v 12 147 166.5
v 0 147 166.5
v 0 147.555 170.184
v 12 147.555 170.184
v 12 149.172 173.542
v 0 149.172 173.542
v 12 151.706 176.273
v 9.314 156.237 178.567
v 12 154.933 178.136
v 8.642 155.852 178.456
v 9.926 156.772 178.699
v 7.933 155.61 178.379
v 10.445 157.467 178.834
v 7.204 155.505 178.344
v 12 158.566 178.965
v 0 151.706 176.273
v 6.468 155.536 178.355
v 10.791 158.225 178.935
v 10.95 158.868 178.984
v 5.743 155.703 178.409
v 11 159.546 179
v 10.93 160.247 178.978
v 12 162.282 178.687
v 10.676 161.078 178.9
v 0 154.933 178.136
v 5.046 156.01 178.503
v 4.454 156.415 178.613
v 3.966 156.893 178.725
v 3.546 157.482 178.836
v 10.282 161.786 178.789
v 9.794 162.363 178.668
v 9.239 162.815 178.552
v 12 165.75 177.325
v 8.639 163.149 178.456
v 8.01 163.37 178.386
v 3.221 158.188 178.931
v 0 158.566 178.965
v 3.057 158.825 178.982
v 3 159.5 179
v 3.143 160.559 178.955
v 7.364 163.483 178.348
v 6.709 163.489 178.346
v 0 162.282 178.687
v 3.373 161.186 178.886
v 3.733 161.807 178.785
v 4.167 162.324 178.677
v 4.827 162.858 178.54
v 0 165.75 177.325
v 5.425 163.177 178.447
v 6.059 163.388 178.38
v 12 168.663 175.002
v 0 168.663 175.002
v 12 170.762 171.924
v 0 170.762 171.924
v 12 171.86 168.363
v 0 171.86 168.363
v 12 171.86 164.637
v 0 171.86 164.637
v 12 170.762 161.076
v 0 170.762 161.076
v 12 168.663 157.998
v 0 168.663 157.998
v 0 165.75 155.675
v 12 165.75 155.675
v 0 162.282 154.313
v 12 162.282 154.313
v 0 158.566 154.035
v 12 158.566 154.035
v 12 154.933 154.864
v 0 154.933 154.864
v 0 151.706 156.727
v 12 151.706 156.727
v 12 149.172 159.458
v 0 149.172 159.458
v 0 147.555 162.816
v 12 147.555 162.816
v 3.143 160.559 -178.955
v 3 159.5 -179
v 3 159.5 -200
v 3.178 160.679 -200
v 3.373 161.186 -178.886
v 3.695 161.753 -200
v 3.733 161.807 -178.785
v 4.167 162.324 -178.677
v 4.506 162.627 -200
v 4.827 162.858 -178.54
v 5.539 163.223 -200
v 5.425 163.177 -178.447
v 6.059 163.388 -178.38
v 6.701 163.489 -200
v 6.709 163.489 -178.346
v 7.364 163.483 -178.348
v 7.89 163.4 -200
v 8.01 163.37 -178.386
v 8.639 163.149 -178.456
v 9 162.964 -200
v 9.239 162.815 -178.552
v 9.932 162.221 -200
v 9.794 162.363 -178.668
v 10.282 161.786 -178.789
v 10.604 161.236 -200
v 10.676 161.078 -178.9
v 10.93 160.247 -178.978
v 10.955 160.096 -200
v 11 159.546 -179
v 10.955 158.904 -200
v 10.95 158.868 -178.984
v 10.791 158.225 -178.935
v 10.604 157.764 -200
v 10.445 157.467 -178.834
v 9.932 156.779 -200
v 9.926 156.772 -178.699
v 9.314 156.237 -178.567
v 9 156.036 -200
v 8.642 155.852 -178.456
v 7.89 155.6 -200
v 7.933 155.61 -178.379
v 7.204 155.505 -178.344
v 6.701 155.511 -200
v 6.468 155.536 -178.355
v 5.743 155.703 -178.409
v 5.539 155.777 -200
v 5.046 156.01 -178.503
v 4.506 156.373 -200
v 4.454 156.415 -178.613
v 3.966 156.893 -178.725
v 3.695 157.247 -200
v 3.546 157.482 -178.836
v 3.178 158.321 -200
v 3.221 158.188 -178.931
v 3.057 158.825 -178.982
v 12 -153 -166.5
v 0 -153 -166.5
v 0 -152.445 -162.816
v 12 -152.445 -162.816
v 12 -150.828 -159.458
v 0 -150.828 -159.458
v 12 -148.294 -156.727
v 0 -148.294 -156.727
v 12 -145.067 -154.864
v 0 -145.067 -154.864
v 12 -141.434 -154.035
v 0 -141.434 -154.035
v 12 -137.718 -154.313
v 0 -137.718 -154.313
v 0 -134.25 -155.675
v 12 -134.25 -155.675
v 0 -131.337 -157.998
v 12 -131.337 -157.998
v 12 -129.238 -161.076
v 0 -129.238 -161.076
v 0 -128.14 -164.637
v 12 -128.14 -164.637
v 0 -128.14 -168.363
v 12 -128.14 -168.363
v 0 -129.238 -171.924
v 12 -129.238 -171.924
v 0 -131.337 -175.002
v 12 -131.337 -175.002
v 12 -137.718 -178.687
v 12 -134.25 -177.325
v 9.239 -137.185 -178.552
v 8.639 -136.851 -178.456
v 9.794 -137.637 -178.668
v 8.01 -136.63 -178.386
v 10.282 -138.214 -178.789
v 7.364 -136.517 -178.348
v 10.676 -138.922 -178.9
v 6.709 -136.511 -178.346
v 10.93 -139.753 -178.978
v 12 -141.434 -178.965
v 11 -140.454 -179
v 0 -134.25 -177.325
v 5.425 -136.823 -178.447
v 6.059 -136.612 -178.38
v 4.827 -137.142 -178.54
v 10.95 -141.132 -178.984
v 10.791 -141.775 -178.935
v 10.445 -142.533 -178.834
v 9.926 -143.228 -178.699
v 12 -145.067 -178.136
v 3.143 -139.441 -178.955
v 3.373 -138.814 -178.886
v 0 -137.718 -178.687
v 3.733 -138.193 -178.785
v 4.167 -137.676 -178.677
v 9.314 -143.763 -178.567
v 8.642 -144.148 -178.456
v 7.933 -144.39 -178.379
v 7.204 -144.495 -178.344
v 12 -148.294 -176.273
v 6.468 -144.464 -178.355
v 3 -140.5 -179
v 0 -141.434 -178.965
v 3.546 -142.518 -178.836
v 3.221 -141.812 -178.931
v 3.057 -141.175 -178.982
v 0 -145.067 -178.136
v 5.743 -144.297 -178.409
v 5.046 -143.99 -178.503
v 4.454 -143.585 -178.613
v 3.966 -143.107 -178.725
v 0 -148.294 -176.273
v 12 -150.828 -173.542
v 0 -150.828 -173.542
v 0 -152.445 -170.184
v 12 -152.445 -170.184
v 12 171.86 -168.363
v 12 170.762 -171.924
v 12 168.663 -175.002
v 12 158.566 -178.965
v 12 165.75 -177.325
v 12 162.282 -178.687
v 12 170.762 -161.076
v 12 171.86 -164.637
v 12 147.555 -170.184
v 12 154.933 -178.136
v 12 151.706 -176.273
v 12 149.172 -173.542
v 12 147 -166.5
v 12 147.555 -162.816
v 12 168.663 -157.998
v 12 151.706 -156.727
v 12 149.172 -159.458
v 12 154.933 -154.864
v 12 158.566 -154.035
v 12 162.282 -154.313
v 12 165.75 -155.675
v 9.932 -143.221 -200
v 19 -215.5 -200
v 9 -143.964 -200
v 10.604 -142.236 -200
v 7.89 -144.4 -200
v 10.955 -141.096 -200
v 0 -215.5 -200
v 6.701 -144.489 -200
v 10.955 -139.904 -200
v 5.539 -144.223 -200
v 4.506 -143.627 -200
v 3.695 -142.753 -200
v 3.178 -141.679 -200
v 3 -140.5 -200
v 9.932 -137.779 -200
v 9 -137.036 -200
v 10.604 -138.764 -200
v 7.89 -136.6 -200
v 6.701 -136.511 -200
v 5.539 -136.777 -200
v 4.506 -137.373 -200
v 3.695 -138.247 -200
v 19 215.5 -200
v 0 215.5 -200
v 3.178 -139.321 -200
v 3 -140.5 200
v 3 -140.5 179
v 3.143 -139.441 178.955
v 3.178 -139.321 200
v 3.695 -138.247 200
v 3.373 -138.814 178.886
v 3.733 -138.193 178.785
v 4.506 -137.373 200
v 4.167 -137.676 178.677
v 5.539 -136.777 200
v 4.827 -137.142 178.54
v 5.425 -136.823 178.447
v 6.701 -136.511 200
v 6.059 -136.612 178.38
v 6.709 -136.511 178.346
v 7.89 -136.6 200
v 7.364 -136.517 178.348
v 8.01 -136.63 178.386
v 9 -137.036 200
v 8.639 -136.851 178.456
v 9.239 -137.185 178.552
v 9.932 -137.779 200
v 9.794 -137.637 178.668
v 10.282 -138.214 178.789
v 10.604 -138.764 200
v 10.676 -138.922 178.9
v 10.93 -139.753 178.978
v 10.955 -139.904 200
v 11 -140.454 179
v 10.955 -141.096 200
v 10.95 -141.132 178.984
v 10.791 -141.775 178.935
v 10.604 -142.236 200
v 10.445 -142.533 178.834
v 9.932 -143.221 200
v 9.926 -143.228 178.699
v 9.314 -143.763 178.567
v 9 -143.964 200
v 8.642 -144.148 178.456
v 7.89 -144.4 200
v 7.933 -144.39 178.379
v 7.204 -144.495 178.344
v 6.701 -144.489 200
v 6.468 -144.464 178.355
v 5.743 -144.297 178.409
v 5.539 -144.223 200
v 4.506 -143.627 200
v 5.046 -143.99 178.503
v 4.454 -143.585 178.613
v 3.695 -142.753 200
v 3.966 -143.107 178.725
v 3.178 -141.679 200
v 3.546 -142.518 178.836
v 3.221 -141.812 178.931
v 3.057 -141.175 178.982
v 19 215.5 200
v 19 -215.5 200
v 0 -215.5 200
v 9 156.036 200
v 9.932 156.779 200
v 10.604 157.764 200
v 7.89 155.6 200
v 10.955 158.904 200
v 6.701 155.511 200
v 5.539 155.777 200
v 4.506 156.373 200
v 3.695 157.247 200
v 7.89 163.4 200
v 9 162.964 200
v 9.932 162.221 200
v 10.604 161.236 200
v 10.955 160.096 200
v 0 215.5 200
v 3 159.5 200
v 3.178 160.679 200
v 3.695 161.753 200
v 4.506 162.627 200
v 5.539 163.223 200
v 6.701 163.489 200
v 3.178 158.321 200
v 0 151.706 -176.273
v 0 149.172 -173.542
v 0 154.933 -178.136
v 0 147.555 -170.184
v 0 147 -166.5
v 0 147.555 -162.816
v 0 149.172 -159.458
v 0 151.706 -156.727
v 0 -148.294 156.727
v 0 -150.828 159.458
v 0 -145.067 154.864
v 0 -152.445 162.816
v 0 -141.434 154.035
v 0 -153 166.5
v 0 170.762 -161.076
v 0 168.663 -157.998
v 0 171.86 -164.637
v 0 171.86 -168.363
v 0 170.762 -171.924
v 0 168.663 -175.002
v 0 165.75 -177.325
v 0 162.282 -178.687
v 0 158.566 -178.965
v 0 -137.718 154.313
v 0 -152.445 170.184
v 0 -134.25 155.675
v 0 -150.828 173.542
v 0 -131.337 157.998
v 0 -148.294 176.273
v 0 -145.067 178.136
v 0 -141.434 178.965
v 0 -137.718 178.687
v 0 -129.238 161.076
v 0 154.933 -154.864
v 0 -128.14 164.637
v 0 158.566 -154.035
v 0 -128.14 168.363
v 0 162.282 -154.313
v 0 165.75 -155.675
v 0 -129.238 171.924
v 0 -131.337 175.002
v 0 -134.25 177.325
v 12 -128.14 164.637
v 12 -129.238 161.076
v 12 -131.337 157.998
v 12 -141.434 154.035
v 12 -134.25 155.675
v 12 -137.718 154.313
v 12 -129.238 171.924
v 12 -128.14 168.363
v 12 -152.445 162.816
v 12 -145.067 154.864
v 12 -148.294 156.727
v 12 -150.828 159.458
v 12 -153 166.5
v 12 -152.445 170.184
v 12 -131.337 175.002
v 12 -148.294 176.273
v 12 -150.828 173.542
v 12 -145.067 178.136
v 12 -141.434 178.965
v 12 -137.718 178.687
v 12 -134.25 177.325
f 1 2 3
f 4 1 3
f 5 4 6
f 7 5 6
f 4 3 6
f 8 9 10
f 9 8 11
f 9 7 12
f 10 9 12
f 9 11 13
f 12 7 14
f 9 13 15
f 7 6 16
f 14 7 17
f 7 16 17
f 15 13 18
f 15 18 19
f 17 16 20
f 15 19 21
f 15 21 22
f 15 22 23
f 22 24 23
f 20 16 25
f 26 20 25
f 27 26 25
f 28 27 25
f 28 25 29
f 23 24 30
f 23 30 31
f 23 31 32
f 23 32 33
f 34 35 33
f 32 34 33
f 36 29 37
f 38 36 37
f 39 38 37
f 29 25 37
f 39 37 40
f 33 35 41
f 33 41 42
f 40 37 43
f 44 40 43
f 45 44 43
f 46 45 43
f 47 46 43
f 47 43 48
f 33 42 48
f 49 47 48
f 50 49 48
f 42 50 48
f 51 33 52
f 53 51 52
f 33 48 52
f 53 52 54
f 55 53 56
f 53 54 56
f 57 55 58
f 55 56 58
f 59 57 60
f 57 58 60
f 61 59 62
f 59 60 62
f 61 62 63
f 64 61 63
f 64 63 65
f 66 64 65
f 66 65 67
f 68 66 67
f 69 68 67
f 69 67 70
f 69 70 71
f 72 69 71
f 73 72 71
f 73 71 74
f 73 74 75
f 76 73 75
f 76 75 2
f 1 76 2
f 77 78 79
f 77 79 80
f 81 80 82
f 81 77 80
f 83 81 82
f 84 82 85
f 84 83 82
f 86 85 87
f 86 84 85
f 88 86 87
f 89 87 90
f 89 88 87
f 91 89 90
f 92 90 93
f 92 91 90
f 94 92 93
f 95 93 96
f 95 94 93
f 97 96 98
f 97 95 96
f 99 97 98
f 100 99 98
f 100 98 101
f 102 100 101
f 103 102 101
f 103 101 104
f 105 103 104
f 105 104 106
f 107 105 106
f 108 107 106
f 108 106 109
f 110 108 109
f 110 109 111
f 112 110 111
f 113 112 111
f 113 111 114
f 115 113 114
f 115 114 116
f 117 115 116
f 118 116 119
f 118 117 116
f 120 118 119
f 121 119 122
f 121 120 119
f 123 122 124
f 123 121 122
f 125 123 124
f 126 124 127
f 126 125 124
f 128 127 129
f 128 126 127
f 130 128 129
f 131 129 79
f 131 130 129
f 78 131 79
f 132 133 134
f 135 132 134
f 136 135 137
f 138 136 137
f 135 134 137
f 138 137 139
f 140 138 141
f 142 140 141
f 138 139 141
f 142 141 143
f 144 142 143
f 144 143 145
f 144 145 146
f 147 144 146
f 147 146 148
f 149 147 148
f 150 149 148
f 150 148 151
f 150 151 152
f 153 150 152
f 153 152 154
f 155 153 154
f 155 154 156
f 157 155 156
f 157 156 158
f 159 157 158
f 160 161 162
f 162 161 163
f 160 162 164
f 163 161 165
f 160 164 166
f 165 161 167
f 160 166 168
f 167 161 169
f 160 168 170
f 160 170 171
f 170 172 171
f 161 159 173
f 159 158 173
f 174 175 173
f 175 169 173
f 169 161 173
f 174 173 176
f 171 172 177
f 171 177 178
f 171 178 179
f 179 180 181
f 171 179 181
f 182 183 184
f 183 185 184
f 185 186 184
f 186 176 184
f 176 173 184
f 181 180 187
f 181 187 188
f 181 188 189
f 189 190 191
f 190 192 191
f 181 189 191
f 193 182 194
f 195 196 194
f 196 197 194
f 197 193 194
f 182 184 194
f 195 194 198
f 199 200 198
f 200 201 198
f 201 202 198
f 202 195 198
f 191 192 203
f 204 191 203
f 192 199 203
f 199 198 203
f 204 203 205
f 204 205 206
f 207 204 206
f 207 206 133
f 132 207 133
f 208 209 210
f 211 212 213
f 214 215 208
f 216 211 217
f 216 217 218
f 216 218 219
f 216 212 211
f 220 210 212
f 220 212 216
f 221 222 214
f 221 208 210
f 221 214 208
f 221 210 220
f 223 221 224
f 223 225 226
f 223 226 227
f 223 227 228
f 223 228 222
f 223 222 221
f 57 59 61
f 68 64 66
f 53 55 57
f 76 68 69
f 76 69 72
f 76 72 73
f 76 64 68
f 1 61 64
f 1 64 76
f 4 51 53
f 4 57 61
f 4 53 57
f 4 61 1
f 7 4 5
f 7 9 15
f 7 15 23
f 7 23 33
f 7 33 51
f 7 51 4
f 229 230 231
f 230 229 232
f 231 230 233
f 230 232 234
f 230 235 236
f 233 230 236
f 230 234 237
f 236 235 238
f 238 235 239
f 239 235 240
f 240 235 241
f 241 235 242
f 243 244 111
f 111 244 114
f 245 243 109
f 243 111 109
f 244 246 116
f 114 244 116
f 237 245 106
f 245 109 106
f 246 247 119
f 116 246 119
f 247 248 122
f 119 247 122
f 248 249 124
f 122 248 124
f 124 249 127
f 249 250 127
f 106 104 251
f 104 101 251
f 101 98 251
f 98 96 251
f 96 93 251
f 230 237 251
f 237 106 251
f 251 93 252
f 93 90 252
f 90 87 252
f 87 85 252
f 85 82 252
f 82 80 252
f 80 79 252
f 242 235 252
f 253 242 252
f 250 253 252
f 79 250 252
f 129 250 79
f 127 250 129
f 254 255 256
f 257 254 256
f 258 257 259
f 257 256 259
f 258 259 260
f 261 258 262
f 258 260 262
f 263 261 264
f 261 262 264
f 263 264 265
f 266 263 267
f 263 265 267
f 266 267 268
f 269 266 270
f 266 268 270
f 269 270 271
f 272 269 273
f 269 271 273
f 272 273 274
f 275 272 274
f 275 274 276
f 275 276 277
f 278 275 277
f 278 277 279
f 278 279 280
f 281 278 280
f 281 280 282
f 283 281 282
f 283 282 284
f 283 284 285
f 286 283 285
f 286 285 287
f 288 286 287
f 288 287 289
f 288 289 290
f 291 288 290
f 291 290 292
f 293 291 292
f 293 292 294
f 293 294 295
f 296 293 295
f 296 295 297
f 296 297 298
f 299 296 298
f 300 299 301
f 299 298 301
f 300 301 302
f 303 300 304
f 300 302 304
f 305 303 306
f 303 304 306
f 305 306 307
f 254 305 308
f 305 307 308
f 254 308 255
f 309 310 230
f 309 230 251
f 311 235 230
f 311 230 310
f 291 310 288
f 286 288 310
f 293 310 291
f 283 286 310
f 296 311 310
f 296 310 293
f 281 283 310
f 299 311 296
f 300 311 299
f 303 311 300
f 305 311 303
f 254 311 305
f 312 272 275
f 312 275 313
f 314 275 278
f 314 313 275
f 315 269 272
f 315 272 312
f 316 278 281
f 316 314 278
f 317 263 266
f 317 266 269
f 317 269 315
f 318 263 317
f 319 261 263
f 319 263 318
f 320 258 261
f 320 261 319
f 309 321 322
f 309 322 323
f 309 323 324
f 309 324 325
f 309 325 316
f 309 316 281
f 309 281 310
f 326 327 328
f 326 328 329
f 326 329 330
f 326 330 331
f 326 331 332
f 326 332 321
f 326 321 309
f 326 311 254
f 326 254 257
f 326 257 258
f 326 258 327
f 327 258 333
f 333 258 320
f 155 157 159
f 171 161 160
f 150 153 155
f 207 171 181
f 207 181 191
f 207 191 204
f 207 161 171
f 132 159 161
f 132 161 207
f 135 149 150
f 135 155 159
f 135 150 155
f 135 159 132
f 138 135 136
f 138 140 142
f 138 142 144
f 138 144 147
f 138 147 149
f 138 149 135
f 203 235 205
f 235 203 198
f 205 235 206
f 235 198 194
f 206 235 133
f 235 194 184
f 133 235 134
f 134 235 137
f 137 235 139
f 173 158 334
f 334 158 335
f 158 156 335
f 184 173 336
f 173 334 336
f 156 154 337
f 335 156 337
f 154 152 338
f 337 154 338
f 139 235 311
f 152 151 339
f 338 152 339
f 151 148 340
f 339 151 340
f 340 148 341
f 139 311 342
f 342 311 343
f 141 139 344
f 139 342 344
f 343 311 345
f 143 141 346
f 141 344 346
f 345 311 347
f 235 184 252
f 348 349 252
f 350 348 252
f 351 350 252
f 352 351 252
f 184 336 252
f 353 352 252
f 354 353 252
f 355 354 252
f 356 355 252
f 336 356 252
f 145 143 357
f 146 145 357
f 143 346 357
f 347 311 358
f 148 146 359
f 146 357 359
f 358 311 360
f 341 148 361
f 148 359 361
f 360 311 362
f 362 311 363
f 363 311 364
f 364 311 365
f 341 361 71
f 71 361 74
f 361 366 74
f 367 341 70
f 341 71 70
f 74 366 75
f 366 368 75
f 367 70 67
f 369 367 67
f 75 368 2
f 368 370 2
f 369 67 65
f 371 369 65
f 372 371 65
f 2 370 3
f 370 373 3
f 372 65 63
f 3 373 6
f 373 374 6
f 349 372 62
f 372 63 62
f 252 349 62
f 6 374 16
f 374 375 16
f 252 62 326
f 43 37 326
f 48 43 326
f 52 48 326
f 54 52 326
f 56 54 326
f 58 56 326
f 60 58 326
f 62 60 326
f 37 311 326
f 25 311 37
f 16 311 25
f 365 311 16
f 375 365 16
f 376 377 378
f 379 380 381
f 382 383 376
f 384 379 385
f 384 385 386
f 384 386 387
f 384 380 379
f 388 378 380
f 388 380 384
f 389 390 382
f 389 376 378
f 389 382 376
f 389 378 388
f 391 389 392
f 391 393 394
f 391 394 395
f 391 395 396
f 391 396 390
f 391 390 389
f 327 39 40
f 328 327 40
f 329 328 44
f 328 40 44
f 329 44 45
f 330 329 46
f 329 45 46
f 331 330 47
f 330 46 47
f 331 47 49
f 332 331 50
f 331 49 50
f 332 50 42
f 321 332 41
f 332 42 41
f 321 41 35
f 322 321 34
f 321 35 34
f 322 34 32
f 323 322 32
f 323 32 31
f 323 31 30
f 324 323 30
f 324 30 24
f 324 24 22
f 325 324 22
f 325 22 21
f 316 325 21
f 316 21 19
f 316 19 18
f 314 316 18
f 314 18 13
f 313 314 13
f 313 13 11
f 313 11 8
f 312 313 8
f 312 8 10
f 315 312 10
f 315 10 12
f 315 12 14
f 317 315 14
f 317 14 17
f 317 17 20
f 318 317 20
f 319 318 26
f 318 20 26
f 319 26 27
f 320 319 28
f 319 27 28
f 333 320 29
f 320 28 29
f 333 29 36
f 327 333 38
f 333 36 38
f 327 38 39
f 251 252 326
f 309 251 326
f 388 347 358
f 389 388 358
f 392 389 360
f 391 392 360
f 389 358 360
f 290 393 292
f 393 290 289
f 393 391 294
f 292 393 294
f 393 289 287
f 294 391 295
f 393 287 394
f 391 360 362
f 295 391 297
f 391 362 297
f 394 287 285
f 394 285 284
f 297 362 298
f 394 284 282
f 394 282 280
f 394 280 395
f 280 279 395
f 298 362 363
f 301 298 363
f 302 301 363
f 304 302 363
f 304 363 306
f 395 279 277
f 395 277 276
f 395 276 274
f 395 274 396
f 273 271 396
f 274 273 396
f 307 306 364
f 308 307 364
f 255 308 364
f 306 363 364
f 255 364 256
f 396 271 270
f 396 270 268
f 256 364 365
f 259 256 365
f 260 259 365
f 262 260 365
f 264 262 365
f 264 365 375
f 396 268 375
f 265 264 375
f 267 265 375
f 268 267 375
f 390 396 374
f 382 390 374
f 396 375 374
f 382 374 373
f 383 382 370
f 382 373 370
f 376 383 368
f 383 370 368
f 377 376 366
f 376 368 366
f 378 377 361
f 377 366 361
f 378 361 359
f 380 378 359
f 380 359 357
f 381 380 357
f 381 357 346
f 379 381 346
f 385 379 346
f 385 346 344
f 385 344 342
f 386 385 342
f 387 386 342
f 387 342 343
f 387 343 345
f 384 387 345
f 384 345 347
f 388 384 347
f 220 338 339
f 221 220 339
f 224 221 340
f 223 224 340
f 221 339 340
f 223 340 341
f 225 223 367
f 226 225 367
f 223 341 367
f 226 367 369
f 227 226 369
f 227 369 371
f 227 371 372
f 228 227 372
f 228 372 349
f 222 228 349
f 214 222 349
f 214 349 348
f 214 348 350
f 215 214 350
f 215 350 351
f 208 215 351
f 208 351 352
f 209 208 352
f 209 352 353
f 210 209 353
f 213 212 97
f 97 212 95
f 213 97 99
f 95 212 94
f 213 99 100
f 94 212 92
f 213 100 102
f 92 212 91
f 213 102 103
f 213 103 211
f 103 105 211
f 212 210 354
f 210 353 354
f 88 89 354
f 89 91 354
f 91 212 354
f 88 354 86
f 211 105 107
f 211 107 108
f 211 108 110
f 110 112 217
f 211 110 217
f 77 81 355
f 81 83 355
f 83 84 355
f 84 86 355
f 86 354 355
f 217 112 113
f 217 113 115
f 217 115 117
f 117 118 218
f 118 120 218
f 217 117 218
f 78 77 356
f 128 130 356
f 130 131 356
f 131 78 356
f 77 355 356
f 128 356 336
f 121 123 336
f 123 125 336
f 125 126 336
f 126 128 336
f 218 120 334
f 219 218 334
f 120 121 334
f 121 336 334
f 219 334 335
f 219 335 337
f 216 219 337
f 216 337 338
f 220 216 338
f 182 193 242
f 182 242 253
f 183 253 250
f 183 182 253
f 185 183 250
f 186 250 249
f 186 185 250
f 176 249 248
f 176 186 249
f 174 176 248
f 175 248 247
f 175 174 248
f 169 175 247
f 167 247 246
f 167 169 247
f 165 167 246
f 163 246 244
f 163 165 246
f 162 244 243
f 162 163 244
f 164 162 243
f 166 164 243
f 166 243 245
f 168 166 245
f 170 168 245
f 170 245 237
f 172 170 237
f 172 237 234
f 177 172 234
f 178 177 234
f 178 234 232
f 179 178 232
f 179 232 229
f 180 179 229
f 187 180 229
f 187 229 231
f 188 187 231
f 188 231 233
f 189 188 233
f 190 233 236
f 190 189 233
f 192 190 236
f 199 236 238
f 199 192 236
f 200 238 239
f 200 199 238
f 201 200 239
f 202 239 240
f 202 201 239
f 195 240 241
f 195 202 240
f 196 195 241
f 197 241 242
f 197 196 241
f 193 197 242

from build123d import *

# Parameters (mm, degrees)
F0_W     = 431
F0_H     = 400
F1_DEPTH = 19
F2_R     = 12.5
F3_DEPTH = 12
F5_D     = 8
F5_DEPTH = 22
F5_TIP   = 2.4034424761


# Not quite as in the source:
# - a pattern or mirror of a feature is missing from the dataset's text; its kind, count and spacing are read off the source's solid


with BuildPart() as f1:
    # F0 (on Right) → F1 (new body)
    with BuildSketch(Plane.YZ):
        Rectangle(F0_W, F0_H)
    extrude(amount=F1_DEPTH)

    # F2 (on face) → F3 (cut)
    with BuildSketch(Plane(origin=(0, 0, 0), x_dir=(0, -1, 0), z_dir=(-1, 0, 0))):
        with Locations((-159.5, 166.5)):
            Circle(F2_R)
        with Locations((140.5, 166.5)):
            Circle(F2_R)
        with Locations((140.5, -166.5)):
            Circle(F2_R)
        with Locations((-159.5, -166.5)):
            Circle(F2_R)
    extrude(amount=-F3_DEPTH, mode=Mode.SUBTRACT)

    # F5
    with Locations(Plane.XY.offset(200)):
        with Locations((7, 159.5), (7, -140.5)):
            f5 = Hole(F5_D / 2, depth=F5_DEPTH)
            with Locations((0, 0, -(F5_DEPTH + F5_TIP / 2))):  # 118° drill point
                Cone(0, F5_D / 2, F5_TIP, mode=Mode.SUBTRACT)

    # F5_copies: F5 across plane
    add(f5.mirror(Plane(origin=(0, 0, 2.1e-05), x_dir=(-1, 0, 0), z_dir=(0, 0, -1))), mode=Mode.SUBTRACT)


solid = f1.part
